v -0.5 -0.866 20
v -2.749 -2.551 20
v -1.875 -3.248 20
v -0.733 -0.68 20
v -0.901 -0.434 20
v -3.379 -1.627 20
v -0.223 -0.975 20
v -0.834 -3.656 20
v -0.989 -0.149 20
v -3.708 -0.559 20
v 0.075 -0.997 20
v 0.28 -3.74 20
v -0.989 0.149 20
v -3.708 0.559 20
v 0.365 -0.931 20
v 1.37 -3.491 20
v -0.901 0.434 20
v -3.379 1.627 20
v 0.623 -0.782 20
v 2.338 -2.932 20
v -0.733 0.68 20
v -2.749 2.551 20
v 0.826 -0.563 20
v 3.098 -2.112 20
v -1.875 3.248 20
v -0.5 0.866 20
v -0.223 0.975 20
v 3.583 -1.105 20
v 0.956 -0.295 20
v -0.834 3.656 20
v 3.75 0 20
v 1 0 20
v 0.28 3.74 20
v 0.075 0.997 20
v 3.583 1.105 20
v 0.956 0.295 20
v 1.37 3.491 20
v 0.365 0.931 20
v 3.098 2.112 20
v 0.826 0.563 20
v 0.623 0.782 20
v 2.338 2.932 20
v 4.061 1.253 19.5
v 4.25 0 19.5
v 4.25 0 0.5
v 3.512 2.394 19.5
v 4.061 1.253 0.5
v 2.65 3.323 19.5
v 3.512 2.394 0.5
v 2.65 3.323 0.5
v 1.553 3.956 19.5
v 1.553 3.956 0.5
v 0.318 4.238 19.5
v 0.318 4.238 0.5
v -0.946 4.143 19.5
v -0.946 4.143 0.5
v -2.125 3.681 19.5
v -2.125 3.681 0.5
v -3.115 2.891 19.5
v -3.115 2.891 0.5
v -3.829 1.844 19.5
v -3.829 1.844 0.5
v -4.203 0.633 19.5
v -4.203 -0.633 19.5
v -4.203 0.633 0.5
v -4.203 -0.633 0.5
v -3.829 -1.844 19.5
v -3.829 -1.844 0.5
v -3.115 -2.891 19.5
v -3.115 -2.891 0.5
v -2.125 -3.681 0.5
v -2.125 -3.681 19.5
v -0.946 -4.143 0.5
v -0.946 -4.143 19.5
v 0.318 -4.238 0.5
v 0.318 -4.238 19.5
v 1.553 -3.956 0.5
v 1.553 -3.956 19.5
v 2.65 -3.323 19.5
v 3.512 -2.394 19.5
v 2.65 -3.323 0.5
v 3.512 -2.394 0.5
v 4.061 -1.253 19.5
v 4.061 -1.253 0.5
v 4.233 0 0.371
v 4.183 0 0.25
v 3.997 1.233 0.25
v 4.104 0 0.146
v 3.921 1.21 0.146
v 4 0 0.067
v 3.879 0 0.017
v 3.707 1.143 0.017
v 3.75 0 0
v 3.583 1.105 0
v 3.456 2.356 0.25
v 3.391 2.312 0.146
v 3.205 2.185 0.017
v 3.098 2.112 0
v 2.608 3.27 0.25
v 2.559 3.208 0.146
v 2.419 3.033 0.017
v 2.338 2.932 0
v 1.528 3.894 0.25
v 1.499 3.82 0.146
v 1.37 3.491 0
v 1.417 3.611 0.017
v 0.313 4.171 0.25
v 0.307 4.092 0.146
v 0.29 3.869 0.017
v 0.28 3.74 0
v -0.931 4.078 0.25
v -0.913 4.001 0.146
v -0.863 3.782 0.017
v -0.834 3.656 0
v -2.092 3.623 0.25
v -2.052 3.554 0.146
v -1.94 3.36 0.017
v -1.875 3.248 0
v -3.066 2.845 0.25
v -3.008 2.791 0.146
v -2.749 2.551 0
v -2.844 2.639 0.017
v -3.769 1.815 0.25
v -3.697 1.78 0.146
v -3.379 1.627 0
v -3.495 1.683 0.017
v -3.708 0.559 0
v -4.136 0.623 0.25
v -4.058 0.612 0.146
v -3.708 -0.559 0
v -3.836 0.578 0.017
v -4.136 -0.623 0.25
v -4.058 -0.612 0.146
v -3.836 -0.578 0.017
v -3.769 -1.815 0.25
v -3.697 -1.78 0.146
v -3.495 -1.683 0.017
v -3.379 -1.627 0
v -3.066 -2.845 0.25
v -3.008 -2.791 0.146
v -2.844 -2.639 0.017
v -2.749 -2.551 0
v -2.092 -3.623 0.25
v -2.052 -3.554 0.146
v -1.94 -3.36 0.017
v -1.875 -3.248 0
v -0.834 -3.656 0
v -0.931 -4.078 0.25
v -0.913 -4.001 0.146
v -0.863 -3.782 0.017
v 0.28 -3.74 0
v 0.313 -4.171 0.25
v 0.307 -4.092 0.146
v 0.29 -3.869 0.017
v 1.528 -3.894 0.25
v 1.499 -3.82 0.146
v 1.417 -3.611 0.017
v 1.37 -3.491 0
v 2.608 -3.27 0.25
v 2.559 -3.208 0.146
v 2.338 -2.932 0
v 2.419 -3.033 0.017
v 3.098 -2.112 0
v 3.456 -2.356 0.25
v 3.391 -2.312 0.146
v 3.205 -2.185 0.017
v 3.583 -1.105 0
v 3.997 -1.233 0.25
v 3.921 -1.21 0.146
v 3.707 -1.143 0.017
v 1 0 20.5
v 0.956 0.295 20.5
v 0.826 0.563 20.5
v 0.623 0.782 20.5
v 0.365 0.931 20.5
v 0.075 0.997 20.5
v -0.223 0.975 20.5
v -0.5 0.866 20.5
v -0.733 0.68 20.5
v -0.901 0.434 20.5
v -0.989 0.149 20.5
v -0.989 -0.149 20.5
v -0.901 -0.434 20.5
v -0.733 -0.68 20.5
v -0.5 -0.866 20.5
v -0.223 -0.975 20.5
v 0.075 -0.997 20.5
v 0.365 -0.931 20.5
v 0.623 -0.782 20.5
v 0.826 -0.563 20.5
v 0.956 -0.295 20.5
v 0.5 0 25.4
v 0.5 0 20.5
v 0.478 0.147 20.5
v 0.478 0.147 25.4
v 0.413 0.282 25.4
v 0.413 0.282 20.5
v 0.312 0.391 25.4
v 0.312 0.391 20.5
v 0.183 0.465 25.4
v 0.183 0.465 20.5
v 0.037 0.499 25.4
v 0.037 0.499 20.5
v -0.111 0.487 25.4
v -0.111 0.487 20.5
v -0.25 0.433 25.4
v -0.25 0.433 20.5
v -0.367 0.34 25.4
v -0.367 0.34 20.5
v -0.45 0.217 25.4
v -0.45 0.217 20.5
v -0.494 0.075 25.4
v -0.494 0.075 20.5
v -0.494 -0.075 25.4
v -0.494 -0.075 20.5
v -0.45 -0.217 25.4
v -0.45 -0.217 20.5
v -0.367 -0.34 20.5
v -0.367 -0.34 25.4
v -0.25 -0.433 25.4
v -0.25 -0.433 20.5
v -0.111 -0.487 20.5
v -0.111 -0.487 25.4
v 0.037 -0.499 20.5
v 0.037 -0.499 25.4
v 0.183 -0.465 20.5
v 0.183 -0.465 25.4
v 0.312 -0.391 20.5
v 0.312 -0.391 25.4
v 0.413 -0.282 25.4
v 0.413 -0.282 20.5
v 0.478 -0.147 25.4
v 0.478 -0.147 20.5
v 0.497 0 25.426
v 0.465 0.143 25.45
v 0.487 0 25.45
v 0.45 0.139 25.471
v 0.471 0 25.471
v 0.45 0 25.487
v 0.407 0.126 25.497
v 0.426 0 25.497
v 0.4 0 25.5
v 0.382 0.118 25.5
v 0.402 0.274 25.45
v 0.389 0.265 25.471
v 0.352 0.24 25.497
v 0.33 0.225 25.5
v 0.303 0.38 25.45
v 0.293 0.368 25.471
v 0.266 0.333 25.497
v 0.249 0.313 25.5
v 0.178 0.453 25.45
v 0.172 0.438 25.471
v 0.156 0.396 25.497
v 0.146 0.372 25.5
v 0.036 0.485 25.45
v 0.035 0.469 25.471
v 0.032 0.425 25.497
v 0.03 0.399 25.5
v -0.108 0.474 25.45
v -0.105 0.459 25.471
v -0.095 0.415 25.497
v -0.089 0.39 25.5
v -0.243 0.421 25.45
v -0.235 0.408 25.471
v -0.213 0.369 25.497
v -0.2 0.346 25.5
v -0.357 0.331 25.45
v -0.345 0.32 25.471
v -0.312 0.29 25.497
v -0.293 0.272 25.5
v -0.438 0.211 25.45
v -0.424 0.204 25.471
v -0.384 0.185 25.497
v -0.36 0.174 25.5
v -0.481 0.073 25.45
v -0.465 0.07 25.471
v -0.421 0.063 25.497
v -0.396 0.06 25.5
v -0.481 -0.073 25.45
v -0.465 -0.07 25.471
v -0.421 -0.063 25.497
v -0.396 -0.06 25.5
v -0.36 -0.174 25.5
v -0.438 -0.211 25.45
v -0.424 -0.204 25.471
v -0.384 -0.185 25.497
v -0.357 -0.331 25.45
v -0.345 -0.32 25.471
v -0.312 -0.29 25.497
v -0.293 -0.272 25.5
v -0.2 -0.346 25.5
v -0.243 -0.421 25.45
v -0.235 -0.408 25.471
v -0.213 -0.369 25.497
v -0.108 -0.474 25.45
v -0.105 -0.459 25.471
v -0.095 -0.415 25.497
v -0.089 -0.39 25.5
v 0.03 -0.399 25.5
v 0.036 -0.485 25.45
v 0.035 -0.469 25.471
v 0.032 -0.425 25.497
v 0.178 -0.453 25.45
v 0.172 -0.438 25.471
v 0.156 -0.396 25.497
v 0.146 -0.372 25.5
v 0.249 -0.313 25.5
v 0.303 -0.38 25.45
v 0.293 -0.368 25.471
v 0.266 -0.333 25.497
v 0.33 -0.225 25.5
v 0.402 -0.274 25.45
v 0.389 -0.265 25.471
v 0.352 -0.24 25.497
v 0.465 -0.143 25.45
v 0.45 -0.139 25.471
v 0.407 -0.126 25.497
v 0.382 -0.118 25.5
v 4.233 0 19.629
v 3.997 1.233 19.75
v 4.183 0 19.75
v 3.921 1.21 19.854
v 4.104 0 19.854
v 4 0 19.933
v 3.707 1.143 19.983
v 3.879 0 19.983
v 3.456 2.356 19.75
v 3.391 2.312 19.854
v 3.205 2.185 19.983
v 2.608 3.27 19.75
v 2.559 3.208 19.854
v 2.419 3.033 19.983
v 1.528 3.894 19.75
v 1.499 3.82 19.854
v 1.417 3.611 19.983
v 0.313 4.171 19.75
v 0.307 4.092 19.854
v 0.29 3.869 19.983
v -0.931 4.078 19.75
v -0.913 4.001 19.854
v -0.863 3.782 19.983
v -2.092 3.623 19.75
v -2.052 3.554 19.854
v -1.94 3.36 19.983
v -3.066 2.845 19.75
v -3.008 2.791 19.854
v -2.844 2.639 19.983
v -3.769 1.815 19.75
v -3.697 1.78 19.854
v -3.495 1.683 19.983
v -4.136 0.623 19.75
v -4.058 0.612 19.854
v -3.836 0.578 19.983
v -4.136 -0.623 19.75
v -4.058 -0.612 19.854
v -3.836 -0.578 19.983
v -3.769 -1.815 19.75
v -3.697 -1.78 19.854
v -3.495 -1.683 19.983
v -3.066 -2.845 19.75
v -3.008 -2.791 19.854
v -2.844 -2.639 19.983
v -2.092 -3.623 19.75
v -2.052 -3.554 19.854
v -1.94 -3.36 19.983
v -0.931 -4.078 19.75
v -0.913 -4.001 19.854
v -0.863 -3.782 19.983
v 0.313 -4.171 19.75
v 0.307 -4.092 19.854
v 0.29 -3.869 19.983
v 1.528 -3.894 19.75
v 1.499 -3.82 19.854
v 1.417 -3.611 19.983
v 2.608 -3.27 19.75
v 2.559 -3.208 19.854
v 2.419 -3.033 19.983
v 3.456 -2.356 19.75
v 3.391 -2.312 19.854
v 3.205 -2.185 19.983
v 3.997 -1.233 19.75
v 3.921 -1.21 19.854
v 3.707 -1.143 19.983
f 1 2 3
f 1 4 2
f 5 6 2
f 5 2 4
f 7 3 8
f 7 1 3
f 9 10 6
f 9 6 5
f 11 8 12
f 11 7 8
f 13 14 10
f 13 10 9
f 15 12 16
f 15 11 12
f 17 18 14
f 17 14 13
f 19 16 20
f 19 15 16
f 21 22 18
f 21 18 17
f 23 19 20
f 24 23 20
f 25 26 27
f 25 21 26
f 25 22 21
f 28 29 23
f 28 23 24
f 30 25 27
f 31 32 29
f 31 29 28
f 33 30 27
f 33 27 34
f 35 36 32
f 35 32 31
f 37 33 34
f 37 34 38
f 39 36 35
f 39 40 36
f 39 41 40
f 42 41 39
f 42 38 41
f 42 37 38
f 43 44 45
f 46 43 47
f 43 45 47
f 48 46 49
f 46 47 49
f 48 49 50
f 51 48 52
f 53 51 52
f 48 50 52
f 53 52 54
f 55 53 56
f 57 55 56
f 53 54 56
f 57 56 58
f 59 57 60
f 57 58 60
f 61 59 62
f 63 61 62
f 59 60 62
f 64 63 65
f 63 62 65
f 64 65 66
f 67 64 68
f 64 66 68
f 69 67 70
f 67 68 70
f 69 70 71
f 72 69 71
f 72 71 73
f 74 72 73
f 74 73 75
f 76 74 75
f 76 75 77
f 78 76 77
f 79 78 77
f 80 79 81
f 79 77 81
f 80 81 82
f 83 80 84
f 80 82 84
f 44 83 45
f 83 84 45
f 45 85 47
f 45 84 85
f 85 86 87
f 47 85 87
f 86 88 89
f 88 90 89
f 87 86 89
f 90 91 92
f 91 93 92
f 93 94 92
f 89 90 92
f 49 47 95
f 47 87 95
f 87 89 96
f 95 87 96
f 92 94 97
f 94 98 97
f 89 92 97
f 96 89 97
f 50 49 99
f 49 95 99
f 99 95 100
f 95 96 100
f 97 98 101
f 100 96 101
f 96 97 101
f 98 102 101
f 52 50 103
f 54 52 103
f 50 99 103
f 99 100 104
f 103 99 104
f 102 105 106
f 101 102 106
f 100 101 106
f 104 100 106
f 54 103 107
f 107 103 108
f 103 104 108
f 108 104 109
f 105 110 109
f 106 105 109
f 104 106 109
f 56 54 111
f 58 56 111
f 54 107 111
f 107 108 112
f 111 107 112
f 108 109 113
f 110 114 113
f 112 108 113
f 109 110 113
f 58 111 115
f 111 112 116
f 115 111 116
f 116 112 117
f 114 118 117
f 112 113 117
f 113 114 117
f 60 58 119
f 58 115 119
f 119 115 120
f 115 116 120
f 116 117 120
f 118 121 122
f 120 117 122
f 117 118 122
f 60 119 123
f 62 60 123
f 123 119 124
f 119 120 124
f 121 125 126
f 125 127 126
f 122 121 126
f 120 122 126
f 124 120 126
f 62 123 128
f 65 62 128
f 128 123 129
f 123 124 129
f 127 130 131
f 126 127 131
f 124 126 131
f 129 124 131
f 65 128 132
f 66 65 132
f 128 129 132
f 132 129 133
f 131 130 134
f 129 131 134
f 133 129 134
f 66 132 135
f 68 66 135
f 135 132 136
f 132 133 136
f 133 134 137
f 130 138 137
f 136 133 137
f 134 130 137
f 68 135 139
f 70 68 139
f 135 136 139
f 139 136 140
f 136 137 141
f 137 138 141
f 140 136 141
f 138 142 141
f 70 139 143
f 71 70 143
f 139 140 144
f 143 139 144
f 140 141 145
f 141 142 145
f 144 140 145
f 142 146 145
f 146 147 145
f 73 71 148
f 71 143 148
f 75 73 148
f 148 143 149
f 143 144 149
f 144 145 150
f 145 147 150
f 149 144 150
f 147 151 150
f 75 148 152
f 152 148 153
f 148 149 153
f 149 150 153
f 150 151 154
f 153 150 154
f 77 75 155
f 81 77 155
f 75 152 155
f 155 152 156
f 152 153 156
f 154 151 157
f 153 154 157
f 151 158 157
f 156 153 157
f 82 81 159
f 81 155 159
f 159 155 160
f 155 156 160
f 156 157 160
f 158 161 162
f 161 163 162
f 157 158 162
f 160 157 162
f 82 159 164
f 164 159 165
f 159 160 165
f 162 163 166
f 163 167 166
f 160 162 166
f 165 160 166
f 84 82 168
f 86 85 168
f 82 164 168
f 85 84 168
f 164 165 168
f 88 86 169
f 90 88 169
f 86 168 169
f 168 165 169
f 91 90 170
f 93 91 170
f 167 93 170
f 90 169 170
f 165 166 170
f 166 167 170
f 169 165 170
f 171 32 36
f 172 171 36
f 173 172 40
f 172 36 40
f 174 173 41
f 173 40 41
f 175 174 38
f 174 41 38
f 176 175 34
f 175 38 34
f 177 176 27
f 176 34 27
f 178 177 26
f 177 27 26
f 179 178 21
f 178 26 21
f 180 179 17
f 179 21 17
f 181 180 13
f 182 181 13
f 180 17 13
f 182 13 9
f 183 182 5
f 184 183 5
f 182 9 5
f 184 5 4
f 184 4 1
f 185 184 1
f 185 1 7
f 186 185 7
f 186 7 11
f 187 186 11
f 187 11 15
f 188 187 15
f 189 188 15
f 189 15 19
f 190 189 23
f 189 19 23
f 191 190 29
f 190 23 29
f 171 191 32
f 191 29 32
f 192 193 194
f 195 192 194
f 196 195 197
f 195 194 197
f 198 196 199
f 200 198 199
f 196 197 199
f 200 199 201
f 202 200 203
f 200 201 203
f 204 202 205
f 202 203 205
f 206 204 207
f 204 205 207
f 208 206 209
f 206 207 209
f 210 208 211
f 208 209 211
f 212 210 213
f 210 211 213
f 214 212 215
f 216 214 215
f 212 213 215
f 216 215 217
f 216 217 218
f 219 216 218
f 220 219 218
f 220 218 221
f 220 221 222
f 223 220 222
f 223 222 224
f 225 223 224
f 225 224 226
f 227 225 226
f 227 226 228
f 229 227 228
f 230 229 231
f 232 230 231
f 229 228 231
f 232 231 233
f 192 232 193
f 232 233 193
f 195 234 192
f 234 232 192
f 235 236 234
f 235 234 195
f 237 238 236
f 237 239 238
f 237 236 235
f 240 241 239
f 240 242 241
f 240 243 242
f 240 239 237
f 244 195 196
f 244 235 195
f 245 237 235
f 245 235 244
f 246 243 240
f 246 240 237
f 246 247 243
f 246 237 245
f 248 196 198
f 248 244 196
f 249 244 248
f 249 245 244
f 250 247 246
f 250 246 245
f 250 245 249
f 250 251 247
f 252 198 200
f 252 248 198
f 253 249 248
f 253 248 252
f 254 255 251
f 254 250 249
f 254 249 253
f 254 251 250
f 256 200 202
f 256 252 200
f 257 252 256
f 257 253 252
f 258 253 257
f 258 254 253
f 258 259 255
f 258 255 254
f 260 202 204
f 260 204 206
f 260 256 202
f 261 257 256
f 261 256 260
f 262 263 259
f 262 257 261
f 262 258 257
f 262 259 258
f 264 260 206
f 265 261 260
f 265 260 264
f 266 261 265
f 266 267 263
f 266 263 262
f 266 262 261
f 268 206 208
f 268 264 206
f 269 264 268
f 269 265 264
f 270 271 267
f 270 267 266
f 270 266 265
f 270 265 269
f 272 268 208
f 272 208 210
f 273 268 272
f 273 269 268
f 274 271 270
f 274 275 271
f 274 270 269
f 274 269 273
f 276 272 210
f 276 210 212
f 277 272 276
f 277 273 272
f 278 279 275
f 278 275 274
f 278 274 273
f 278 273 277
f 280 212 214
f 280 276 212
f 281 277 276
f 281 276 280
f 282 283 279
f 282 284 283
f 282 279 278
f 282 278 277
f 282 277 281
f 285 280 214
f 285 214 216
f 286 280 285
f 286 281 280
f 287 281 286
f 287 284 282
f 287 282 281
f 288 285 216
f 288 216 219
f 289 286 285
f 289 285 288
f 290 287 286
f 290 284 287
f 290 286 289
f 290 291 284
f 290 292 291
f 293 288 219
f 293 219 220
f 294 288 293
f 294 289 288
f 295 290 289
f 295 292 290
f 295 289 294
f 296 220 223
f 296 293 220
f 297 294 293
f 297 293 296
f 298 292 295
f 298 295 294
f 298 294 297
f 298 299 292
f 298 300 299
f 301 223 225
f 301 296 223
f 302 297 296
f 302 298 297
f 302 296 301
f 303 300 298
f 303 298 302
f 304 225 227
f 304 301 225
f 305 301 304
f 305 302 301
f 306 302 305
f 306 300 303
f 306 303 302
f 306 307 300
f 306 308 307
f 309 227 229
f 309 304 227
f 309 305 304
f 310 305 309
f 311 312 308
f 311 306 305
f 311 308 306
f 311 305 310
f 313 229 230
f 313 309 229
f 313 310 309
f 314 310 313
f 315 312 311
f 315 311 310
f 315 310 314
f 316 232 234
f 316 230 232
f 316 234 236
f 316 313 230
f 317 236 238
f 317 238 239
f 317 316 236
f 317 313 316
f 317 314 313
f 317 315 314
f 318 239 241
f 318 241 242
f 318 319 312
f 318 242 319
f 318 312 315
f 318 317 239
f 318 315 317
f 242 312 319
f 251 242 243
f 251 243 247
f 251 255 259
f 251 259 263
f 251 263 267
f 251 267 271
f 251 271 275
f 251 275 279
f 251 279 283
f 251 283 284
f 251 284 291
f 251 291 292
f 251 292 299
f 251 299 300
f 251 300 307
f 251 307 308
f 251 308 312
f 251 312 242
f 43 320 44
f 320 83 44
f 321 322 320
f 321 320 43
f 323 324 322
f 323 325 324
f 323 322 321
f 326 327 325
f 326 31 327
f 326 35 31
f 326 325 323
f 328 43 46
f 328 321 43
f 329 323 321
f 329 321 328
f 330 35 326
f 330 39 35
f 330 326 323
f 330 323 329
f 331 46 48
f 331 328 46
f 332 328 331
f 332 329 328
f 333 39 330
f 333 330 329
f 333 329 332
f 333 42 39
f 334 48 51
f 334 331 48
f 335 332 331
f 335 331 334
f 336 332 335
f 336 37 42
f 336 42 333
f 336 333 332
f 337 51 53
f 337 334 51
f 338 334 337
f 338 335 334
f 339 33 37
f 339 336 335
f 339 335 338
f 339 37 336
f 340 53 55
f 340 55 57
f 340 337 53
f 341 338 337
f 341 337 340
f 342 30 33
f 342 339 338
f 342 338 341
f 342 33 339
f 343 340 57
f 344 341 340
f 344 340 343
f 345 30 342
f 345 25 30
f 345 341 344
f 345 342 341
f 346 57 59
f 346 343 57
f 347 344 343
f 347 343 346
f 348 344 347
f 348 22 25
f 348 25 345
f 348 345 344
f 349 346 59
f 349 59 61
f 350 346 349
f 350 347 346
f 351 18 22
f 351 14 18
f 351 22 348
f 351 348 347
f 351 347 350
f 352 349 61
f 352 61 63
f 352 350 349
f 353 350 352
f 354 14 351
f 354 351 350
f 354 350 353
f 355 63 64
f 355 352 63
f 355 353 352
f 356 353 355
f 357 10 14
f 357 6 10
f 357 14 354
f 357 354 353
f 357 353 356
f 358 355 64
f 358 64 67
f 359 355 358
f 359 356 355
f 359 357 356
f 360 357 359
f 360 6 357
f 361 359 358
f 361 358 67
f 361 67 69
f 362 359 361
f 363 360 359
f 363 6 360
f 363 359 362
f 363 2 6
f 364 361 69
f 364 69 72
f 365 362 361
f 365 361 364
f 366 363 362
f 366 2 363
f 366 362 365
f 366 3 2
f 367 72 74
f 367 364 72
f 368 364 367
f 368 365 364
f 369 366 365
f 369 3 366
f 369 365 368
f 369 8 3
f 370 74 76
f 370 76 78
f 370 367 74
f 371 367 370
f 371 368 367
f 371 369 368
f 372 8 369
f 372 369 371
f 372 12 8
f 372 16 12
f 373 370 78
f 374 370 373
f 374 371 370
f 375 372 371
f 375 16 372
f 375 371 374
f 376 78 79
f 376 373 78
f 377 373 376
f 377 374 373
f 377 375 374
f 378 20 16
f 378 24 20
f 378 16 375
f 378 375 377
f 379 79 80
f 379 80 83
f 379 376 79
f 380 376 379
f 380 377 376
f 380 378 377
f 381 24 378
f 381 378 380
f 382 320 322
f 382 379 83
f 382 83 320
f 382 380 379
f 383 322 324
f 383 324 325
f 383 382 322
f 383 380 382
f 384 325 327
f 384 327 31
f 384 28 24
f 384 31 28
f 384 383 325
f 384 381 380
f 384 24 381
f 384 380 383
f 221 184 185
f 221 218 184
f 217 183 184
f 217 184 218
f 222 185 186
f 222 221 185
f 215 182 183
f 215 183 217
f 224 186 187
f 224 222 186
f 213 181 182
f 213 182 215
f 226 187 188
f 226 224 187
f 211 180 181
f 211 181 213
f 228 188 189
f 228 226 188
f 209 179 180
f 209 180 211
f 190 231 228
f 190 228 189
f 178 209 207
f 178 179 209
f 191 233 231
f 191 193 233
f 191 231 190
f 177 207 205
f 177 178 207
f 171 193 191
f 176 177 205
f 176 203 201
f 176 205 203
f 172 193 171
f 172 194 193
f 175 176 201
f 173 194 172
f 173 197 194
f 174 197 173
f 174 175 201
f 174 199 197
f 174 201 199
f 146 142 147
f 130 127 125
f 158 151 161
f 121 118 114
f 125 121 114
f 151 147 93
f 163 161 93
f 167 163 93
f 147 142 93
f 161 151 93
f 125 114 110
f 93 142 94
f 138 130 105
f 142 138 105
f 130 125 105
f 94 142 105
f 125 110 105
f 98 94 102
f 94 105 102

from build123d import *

# Parameters (mm, degrees)
SKETCH1_R           = 4.25
BOSS_EXTRUDE1_DEPTH = 20
SKETCH2_R           = 1
BOSS_EXTRUDE2_DEPTH = 0.5
SKETCH3_R           = 0.5
BOSS_EXTRUDE3_DEPTH = 5
FILLET2_R           = 0.5
FILLET3_R           = 0.1
FILLET4_R           = 0.5


with BuildPart() as part:
    # Sketch1 → Boss-Extrude1 (new body)
    with BuildSketch(Plane.XY):
        Circle(SKETCH1_R)
    extrude(amount=BOSS_EXTRUDE1_DEPTH)

    # Sketch2 → Boss-Extrude2 (add)
    with BuildSketch(Plane.XY.offset(20)):
        Circle(SKETCH2_R)
    extrude(amount=BOSS_EXTRUDE2_DEPTH)

    # Sketch3 → Boss-Extrude3 (add)
    with BuildSketch(Plane.XY.offset(20.5)):
        Circle(SKETCH3_R)
    extrude(amount=BOSS_EXTRUDE3_DEPTH)

    # Fillet2
    fillet2_edges = [part.edges().sort_by_distance(p)[0] for p in [
        (-4.25, 0, 20),
    ]]
    fillet(fillet2_edges, radius=FILLET2_R)

    # Fillet3
    fillet3_edges = [part.edges().sort_by_distance(p)[0] for p in [
        (-0.5, 0, 25.5),
    ]]
    fillet(fillet3_edges, radius=FILLET3_R)

    # Fillet4
    fillet4_edges = [part.edges().sort_by_distance(p)[0] for p in [
        (-4.25, 0, 0),
    ]]
    fillet(fillet4_edges, radius=FILLET4_R)


solid = part.part
